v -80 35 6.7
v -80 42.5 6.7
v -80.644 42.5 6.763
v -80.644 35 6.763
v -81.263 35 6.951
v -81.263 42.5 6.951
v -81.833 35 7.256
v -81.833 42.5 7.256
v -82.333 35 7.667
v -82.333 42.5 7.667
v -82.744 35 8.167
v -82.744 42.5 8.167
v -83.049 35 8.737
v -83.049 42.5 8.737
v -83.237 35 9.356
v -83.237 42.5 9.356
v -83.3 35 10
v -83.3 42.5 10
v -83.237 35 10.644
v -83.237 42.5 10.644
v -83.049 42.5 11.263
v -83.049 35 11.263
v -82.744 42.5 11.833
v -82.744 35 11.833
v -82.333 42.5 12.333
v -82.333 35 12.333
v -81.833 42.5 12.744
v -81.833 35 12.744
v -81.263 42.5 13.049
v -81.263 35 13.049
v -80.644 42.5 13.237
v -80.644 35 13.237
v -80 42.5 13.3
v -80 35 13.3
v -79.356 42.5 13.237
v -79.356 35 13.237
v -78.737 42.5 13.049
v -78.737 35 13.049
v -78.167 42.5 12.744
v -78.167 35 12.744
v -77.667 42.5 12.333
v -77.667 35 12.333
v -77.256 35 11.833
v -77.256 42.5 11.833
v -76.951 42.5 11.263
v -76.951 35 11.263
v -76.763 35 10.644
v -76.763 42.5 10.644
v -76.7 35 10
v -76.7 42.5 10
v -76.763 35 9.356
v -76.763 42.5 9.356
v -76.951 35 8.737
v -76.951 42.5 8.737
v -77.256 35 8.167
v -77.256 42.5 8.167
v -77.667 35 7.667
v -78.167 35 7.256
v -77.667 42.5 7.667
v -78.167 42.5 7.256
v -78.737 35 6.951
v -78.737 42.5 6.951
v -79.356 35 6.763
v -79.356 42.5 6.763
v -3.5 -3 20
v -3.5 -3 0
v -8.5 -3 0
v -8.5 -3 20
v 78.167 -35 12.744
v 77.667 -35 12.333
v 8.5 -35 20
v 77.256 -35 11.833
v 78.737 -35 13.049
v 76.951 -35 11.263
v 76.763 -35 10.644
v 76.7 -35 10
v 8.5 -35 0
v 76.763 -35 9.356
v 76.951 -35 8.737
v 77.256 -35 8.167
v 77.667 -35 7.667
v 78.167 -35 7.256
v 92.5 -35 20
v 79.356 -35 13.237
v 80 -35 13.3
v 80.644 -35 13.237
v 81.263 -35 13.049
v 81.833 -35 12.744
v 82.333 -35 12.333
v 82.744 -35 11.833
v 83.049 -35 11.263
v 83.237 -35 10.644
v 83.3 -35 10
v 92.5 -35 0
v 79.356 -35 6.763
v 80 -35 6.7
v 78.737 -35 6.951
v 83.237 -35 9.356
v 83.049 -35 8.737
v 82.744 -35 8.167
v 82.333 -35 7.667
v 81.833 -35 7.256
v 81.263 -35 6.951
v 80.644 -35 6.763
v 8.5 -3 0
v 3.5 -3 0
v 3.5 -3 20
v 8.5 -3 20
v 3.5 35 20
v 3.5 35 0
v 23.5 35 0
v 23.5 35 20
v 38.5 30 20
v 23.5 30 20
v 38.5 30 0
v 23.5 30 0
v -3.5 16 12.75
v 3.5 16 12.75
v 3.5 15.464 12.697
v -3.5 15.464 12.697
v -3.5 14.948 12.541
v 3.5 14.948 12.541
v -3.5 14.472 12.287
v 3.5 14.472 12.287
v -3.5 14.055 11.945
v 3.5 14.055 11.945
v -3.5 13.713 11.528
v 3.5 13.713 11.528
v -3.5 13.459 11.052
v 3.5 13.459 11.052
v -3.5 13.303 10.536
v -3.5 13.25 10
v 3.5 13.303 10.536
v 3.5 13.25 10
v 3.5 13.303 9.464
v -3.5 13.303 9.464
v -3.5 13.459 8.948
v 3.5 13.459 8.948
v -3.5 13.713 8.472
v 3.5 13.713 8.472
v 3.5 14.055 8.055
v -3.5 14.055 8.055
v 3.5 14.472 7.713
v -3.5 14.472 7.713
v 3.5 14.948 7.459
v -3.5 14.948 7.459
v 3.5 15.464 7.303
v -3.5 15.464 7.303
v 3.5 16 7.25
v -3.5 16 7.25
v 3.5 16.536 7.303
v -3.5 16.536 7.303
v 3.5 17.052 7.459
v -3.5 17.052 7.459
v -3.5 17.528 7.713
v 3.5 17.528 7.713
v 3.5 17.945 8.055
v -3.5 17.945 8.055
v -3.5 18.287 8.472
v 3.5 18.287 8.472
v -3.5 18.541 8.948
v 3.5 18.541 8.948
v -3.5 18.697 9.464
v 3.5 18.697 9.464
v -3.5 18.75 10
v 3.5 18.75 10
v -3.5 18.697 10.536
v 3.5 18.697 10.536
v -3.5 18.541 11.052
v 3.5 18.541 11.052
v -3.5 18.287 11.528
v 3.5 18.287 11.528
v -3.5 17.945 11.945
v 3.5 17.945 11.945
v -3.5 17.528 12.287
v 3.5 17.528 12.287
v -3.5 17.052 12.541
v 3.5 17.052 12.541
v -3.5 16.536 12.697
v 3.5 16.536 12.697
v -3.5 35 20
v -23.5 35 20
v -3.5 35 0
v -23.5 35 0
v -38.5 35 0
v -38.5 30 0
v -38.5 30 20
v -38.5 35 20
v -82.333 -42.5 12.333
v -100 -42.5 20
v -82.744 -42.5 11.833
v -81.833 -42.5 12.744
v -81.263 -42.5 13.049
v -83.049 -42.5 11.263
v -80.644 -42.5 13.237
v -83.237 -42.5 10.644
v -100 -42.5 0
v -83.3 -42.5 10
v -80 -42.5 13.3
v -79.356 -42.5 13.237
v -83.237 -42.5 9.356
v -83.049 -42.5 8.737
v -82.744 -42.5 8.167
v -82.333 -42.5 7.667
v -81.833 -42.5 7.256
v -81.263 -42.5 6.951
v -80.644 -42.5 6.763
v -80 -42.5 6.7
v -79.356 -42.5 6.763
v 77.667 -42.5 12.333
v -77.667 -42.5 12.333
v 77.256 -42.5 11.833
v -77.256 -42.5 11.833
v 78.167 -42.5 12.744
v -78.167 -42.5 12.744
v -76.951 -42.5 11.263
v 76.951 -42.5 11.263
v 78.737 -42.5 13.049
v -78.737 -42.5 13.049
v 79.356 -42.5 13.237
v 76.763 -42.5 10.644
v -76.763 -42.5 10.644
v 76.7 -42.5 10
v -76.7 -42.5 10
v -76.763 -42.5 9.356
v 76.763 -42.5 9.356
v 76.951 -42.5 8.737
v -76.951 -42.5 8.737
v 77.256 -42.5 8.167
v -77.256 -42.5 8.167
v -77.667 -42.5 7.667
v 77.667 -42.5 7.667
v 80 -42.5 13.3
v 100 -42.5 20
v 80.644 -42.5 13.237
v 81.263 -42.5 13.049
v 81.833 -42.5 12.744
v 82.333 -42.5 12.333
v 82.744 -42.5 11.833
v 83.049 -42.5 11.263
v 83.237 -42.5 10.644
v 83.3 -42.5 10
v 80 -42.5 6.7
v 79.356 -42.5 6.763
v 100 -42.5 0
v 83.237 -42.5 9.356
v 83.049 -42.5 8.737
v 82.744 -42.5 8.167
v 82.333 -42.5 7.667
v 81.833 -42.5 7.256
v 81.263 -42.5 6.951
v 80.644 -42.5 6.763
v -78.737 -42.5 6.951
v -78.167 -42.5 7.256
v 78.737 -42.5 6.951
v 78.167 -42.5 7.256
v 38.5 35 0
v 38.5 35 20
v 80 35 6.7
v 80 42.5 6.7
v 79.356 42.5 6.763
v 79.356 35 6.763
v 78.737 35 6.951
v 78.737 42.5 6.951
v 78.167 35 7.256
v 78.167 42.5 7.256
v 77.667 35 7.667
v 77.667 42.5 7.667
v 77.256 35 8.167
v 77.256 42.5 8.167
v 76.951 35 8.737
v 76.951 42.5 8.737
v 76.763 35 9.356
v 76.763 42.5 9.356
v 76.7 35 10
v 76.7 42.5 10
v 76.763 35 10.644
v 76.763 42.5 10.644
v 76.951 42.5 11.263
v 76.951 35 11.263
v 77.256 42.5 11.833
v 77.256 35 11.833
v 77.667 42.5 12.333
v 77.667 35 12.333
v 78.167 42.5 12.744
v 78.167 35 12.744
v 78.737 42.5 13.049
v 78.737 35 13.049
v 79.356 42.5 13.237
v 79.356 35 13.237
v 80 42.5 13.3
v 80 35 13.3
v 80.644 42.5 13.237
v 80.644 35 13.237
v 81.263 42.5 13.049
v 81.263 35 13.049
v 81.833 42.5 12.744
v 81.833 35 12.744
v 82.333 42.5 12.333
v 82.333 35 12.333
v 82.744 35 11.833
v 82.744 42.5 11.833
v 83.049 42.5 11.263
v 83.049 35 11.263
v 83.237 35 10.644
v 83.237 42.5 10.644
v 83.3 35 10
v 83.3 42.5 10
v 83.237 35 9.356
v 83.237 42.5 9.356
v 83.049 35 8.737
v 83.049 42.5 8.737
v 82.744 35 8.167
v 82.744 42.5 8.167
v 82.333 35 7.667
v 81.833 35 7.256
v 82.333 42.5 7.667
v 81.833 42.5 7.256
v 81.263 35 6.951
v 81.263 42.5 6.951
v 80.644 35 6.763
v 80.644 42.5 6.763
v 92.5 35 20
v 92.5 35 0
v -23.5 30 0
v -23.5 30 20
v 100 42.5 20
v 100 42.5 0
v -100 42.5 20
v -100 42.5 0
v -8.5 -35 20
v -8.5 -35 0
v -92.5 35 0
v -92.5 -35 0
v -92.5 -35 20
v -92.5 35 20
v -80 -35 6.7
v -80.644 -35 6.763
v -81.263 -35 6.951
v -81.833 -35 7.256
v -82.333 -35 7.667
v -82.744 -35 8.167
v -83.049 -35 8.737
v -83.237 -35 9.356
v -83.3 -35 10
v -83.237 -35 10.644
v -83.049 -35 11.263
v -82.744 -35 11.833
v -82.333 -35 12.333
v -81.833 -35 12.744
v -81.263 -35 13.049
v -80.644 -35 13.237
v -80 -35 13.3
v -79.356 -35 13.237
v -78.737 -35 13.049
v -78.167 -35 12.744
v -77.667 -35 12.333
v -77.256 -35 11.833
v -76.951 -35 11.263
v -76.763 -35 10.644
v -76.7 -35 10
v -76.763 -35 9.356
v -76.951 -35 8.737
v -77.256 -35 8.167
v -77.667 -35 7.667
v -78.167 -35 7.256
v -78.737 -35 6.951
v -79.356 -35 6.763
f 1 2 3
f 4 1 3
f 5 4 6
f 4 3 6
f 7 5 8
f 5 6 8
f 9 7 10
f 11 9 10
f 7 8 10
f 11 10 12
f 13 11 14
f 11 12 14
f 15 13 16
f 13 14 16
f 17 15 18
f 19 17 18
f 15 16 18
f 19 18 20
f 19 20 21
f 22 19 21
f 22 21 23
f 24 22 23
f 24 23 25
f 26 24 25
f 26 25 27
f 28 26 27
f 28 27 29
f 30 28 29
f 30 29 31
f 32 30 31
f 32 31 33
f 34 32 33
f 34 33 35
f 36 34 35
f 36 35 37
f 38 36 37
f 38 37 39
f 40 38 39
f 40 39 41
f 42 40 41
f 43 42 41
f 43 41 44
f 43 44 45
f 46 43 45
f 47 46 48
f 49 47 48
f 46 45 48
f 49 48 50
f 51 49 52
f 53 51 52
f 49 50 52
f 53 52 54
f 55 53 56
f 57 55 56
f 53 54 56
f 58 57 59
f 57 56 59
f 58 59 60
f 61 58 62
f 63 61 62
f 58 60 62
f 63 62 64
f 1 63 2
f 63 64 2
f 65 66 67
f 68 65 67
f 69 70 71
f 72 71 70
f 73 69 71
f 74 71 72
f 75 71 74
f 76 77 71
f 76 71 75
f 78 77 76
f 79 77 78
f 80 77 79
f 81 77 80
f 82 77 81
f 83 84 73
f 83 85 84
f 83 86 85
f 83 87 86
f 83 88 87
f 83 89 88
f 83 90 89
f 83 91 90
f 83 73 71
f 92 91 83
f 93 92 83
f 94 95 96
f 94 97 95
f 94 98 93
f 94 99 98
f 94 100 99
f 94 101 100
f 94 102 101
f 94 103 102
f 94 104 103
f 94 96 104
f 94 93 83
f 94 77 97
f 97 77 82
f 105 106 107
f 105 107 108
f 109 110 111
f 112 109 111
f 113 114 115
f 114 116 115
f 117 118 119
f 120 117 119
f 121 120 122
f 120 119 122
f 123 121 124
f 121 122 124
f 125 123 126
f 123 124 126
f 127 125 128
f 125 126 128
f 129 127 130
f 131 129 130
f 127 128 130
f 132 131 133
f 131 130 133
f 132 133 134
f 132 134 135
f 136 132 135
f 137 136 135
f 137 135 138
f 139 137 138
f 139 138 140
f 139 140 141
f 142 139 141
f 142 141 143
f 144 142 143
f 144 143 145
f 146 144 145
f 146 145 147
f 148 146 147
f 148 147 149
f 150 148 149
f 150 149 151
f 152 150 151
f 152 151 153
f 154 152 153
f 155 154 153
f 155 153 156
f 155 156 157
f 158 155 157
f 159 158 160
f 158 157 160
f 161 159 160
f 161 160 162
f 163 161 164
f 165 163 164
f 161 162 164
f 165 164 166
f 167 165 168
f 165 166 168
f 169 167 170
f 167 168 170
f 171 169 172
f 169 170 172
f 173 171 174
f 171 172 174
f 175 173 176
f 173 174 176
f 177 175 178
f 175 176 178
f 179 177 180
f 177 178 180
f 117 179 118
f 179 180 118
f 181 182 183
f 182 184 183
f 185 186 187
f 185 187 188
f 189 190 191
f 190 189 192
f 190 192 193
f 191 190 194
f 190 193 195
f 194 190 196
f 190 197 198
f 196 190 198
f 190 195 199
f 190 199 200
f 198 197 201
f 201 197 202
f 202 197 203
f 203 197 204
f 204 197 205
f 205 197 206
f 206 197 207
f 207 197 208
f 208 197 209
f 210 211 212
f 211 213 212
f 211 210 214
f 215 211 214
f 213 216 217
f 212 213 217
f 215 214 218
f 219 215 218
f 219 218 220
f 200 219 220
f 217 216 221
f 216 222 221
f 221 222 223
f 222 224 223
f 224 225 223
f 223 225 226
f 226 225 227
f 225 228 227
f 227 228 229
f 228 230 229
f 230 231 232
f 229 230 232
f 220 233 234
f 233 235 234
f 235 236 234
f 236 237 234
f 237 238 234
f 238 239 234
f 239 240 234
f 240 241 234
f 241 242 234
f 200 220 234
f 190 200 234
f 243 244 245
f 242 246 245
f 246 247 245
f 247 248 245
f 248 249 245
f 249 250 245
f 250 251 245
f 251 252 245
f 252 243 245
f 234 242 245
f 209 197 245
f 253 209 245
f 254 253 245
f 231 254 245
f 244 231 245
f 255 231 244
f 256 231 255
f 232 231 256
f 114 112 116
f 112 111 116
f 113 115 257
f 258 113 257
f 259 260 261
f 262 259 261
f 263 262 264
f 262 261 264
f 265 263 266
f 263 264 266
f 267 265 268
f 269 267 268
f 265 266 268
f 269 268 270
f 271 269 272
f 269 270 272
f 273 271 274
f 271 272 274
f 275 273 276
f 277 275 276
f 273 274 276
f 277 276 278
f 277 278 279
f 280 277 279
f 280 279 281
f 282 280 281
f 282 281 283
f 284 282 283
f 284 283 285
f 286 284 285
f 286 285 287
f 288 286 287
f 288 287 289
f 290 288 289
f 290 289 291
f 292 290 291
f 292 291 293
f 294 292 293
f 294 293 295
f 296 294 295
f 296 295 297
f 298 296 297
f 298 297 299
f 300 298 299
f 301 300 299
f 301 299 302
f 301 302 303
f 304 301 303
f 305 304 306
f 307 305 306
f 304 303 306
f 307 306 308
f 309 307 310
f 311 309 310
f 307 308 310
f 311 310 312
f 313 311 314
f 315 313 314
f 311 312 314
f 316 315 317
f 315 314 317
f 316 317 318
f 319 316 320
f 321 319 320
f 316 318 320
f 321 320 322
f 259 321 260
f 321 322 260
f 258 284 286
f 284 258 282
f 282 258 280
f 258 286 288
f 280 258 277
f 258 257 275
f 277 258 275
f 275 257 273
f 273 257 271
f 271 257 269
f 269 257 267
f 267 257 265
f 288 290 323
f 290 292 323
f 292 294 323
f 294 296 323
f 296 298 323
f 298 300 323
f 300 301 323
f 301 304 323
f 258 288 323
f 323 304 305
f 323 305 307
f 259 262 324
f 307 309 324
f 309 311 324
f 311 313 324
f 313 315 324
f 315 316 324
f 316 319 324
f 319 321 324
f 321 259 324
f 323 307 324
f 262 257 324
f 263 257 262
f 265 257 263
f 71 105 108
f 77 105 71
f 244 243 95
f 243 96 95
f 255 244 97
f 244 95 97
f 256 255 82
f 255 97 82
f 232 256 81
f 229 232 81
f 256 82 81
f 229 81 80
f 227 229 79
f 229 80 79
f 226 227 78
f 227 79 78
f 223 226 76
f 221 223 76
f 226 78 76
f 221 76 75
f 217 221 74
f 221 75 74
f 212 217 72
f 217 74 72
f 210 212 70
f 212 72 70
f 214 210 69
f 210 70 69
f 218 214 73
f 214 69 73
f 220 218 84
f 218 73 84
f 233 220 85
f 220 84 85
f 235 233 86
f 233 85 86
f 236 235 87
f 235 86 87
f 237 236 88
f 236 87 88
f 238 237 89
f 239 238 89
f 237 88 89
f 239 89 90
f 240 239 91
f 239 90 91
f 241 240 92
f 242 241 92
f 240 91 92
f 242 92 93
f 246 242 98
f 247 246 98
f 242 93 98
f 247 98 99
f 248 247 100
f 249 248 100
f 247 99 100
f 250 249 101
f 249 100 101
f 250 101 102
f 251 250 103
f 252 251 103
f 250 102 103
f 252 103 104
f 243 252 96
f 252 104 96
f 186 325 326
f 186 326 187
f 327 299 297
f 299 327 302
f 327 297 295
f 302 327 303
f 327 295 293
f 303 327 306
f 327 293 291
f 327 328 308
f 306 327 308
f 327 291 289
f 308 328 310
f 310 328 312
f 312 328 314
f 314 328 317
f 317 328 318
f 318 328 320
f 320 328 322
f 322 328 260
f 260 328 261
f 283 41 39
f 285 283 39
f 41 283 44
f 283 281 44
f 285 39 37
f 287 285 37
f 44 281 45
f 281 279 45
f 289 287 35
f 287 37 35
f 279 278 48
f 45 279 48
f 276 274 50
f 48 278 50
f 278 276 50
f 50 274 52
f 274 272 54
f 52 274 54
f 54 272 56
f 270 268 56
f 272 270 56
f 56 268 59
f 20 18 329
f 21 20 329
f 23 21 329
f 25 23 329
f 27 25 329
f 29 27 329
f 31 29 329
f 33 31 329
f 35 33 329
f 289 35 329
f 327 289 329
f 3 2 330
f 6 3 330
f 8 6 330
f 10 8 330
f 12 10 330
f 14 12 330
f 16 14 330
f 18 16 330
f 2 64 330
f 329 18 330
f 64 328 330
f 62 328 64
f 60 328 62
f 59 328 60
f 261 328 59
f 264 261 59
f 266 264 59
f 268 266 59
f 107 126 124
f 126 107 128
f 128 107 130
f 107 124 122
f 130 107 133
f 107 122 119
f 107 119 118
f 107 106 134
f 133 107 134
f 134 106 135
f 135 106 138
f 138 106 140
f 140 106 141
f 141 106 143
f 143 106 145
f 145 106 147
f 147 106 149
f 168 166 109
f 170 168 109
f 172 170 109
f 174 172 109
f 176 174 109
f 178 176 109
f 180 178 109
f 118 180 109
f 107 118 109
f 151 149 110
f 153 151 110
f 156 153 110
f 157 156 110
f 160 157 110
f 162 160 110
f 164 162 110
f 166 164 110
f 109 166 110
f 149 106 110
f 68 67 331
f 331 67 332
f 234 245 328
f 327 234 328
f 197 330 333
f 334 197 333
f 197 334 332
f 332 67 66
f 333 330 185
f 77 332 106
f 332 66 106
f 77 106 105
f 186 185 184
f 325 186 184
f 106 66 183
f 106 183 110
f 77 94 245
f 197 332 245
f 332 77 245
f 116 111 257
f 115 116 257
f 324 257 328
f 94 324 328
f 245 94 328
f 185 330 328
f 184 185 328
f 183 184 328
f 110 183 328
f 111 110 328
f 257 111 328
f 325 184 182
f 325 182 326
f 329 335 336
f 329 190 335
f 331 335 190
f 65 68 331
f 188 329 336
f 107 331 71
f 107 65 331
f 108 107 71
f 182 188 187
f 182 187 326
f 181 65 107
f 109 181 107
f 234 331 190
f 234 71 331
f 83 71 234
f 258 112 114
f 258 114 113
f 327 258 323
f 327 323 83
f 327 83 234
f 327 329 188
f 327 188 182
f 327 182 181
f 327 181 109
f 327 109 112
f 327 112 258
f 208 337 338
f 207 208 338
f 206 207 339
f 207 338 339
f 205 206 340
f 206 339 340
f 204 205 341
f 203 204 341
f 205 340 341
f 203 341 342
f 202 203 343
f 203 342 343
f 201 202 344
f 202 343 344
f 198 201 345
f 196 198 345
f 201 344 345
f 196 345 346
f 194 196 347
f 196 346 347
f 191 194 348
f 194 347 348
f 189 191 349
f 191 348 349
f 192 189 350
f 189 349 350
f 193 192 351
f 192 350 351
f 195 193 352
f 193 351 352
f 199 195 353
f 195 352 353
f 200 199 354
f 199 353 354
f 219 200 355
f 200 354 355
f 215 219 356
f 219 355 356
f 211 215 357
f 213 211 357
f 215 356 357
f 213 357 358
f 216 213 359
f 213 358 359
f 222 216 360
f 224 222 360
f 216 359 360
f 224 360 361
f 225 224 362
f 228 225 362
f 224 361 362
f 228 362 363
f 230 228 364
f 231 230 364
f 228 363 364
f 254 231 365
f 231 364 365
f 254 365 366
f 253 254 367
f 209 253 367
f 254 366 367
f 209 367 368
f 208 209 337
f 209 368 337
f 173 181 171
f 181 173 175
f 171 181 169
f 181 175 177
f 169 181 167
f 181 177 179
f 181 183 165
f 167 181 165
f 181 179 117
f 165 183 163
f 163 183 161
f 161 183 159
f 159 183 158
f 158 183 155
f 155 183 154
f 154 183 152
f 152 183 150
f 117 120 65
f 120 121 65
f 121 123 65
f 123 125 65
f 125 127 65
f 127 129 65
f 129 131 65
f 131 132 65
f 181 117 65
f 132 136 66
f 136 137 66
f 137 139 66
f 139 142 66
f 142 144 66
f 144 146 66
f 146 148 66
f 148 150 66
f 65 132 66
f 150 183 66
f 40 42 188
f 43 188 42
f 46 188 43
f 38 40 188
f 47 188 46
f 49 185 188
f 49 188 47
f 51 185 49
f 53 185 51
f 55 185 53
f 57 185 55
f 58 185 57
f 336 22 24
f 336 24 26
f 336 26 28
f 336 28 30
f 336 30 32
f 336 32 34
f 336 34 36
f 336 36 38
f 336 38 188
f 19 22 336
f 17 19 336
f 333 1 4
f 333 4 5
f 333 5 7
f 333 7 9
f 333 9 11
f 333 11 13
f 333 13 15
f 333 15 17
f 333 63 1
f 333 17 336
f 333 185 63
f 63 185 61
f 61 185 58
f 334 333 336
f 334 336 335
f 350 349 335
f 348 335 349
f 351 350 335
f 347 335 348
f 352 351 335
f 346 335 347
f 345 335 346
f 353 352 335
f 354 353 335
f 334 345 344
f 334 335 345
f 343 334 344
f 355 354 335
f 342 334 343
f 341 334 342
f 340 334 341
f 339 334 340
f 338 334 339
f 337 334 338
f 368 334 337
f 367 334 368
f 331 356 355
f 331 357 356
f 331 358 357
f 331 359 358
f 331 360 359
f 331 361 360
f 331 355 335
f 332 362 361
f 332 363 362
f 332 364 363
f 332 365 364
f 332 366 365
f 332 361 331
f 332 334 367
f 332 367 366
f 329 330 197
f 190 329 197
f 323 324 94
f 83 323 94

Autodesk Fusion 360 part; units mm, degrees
sketch "Sketch1" plane through (0, 0, 0) normal (0, 0, 1) x (1, 0, 0)
  line L0 (80, 0) -> (-80, 0) construction
  line L1 (100, 42.5) -> (-100, 42.5)
  line L2 (-100, 42.5) -> (-100, -42.5)
  line L3 (-100, -42.5) -> (100, -42.5)
  line L4 (100, -42.5) -> (100, 42.5)
  circle A0 centre (80, 0) radius 2.75
  circle A1 centre (-80, 0) radius 2.75
  line L5 (-90, 35) -> (-3.5, 35)
  line L6 (3.5, 35) -> (90, 35)
  line L7 (3.5, -35) -> (90, -35)
  line L8 (-3.5, -35) -> (-90, -35)
  line L9 (-3.5, 35) -> (-3.5, -3)
  line L10 (3.5, -3) -> (3.5, 35)
  line L11 (3.5, -3) -> (8.5, -3)
  line L12 (-3.5, -3) -> (-8.5, -3)
  line L13 (8.5, -3) -> (8.5, -35)
  line L14 (-8.5, -3) -> (-8.5, -35)
  line L15 (-90, 35) -> (-92.5, 35)
  line L16 (-92.5, 35) -> (-92.5, -35)
  line L17 (-92.5, -35) -> (-90, -35)
  line L18 (90, 35) -> (92.5, 35)
  line L19 (92.5, 35) -> (92.5, -35)
  line L20 (92.5, -35) -> (90, -35)
  line L21 (-23.5, 35) -> (-23.5, 30)
  line L22 (-23.5, 30) -> (-38.5, 30)
  line L23 (-38.5, 30) -> (-38.5, 35)
  line L24 (23.5, 35) -> (23.5, 30)
  line L25 (23.5, 30) -> (38.5, 30)
  line L26 (38.5, 30) -> (38.5, 35)
  dimension "d9" = 160
  dimension "d12" = 200
  dimension "d13" = 85
  dimension "d14" = 5.5
  dimension "d15" = 5.5
  dimension "d46" = 7
  dimension "d47" = 38
  dimension "d55" = 5
  dimension "d56" = 5
  dimension "d66" = 2.5
  dimension "d67" = 2.5
  dimension "d68" = 20
  dimension "d69" = 15
  dimension "d70" = 20
  dimension "d71" = 15
sketch "Sketch3" plane through (0, -42.5, 0) normal (0, -1, 0) x (1, 0, 0)
  line L0 (-100, 0) -> (100, 0)
  line L1 (100, 0) -> (100, 20)
  line L2 (100, 20) -> (-100, 20)
  line L3 (-100, 20) -> (-100, 0)
  line L4 (-100, 10) -> (-80, 10) construction
  line L5 (100, 10) -> (80, 10) construction
  dimension "d50" = 20
  dimension "d51" = 20
sketch "Sketch4" plane through (-3.5, 0, 0) normal (-1, 0, 0) x (0, -1, 0)
  line L0 (-35, 0) -> (3, 0)
  line L1 (3, 0) -> (3, 20)
  line L2 (3, 20) -> (-35, 20)
  line L3 (-35, 20) -> (-35, 0)
  line L4 (-35, 10) -> (3, 10) construction
  line L5 (-16, 20) -> (-16, 0) construction
  circle A0 centre (-16, 10) radius 2.75
  dimension "d62" = 5.5
extrude "Extrude7" add sketch "Sketch1" along normal blind 20 contours L1 L2 L3 L4 | L5 L21 L22 L23 | L6 L24 L25 L26
hole "Hole6" at (-80, -42.5, 10) at (80, -42.5, 10) direction (0, 1, 0) diameter 6.6 depth 85 tip angle 180
hole "Hole7" at (-3.5, 16, 10) direction (1, 0, 0) diameter 5.5 depth 7 tip angle 180
